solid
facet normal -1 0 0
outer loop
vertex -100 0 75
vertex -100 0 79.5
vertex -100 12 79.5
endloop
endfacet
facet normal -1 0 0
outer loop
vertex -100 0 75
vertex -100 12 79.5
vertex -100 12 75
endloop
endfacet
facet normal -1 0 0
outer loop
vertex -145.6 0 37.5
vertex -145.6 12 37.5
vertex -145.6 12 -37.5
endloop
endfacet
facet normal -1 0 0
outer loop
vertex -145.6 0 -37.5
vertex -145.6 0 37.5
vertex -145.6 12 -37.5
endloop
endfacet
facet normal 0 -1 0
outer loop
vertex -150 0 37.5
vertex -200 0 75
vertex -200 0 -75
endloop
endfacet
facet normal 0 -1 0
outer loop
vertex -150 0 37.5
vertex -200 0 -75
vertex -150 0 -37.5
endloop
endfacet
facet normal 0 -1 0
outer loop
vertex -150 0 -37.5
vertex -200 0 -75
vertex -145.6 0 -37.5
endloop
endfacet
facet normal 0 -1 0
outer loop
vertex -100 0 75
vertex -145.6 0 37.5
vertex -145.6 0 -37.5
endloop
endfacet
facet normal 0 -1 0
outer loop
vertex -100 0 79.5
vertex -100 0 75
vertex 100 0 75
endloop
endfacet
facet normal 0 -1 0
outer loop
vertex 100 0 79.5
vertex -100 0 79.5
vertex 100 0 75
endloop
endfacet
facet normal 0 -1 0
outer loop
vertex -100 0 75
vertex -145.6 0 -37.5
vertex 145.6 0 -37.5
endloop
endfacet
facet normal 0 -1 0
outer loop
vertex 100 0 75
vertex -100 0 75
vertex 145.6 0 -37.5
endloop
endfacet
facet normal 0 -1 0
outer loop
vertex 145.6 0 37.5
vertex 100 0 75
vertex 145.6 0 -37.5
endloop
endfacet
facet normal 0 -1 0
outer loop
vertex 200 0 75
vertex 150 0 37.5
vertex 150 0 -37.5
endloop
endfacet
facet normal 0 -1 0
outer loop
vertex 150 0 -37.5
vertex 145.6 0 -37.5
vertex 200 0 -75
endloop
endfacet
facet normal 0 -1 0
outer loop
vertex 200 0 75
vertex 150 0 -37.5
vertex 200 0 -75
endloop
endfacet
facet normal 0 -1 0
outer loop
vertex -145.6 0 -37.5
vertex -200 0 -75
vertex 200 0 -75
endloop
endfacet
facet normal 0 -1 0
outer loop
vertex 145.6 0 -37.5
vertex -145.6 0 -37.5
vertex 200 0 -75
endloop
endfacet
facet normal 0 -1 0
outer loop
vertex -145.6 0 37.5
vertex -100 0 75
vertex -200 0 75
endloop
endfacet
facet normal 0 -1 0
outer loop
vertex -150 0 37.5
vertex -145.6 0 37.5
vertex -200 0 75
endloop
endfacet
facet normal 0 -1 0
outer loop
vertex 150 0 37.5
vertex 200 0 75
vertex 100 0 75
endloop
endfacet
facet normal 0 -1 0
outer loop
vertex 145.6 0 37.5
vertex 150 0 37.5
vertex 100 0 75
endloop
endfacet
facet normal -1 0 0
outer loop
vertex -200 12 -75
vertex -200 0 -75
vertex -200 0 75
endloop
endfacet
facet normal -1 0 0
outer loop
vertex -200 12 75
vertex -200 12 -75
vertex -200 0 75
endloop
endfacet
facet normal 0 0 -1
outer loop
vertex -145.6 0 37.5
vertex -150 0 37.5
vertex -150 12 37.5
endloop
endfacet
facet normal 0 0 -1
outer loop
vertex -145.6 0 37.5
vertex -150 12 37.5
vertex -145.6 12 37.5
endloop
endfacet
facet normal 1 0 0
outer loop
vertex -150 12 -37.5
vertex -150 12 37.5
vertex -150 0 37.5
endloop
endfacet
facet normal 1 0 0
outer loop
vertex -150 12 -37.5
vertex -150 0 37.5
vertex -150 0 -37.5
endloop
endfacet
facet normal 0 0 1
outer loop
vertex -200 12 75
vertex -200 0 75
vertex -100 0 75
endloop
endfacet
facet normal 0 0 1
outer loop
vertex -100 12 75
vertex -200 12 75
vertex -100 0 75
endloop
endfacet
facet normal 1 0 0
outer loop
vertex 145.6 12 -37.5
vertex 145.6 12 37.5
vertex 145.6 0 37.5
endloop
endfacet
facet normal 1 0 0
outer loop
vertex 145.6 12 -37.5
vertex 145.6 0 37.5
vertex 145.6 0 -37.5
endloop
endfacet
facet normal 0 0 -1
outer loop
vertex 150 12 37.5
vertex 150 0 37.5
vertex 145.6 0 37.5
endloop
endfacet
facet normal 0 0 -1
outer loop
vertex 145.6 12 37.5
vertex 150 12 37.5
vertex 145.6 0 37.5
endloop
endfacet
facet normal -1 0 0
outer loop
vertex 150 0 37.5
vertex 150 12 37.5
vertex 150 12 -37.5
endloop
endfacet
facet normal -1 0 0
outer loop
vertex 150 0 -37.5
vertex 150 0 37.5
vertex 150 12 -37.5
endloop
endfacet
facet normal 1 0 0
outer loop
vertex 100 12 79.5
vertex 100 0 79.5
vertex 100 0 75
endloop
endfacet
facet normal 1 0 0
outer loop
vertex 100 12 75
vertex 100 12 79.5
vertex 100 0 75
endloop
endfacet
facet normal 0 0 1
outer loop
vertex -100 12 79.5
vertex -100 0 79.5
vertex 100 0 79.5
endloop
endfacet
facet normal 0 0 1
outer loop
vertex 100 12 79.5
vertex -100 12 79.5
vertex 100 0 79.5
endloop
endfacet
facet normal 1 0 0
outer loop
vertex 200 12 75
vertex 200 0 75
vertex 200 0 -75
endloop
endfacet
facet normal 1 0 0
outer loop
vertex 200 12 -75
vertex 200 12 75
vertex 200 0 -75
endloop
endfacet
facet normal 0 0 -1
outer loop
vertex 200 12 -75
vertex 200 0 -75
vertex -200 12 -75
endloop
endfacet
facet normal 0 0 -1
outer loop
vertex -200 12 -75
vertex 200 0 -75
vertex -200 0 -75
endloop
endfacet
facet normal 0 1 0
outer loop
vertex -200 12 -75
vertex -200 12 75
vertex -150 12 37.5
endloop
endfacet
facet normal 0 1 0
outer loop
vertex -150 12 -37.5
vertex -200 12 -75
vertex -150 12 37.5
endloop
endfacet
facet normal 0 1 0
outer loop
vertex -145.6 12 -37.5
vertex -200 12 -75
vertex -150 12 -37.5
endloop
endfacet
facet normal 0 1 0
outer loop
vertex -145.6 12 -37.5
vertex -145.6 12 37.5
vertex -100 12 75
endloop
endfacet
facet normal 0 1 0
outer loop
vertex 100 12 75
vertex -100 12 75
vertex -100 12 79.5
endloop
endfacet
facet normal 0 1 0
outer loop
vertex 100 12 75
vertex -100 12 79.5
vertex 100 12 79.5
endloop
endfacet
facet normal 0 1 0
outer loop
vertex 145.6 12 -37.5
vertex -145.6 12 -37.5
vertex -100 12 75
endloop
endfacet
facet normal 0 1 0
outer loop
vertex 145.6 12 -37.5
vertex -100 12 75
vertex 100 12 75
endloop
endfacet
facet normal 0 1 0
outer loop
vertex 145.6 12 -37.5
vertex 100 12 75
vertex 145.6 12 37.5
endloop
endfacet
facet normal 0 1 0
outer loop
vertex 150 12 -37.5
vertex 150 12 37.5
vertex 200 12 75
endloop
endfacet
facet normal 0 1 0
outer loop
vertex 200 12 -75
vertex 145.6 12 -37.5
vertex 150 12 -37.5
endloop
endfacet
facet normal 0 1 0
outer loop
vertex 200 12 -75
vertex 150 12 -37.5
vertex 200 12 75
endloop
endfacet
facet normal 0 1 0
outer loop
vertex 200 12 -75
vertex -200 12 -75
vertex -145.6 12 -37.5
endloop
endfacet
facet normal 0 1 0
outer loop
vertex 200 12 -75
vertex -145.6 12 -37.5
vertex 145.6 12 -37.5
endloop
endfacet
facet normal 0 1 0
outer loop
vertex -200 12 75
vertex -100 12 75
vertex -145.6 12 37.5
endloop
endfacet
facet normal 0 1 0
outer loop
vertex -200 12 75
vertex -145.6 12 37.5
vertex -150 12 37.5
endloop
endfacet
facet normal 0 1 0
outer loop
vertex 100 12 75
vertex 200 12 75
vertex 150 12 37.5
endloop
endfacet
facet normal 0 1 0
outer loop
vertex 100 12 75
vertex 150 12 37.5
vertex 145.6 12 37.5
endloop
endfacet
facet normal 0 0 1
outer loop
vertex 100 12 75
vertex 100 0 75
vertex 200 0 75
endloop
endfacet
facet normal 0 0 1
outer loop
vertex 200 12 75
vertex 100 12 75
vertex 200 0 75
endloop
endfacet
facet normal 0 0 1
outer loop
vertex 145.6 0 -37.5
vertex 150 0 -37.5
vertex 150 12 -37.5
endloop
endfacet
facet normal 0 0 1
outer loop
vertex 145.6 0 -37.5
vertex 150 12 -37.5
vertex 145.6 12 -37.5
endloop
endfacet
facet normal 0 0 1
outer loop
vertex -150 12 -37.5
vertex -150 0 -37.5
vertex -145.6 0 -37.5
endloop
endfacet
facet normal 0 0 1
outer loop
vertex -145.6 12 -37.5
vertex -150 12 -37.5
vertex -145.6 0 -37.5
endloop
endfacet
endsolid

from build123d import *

# Parameters (mm, degrees)
SKETCH1_W           = 200
SKETCH1_H           = 4.5
BOSS_EXTRUDE1_DEPTH = 12
SKETCH3_W           = 4.4
SKETCH3_H           = 75
CUT_EXTRUDE1_DEPTH  = 12


with BuildPart() as part:
    # Sketch1 → Boss-Extrude1 (new body)
    with BuildSketch(Plane(origin=(0, 0, 0), x_dir=(1, 0, 0), z_dir=(0, 1, 0))):
        Polygon((200, 75), (-200, 75), (-200, -75), (-100, -75), (-100, -70.5), (100, -70.5), (100, -75), (200, -75), align=None)
        with Locations((0, -77.25)):
            Rectangle(SKETCH1_W, SKETCH1_H)
        with Locations((0, -72.75)):
            Rectangle(SKETCH1_W, SKETCH1_H)
    extrude(amount=BOSS_EXTRUDE1_DEPTH)

    # Sketch3 → Cut-Extrude1 (cut)
    with BuildSketch(Plane(origin=(0, 12, 0), x_dir=(1, 0, 0), z_dir=(0, 1, 0))):
        with Locations((-147.8, 0)):
            Rectangle(SKETCH3_W, SKETCH3_H)
    cut_extrude1 = extrude(amount=-CUT_EXTRUDE1_DEPTH, mode=Mode.SUBTRACT)

    # Mirror1: Cut-Extrude1 across plane
    add(cut_extrude1.mirror(Plane(origin=(0, 0, 0), x_dir=(0, 0, 1), z_dir=(1, 0, 0))), mode=Mode.SUBTRACT)


solid = part.part
